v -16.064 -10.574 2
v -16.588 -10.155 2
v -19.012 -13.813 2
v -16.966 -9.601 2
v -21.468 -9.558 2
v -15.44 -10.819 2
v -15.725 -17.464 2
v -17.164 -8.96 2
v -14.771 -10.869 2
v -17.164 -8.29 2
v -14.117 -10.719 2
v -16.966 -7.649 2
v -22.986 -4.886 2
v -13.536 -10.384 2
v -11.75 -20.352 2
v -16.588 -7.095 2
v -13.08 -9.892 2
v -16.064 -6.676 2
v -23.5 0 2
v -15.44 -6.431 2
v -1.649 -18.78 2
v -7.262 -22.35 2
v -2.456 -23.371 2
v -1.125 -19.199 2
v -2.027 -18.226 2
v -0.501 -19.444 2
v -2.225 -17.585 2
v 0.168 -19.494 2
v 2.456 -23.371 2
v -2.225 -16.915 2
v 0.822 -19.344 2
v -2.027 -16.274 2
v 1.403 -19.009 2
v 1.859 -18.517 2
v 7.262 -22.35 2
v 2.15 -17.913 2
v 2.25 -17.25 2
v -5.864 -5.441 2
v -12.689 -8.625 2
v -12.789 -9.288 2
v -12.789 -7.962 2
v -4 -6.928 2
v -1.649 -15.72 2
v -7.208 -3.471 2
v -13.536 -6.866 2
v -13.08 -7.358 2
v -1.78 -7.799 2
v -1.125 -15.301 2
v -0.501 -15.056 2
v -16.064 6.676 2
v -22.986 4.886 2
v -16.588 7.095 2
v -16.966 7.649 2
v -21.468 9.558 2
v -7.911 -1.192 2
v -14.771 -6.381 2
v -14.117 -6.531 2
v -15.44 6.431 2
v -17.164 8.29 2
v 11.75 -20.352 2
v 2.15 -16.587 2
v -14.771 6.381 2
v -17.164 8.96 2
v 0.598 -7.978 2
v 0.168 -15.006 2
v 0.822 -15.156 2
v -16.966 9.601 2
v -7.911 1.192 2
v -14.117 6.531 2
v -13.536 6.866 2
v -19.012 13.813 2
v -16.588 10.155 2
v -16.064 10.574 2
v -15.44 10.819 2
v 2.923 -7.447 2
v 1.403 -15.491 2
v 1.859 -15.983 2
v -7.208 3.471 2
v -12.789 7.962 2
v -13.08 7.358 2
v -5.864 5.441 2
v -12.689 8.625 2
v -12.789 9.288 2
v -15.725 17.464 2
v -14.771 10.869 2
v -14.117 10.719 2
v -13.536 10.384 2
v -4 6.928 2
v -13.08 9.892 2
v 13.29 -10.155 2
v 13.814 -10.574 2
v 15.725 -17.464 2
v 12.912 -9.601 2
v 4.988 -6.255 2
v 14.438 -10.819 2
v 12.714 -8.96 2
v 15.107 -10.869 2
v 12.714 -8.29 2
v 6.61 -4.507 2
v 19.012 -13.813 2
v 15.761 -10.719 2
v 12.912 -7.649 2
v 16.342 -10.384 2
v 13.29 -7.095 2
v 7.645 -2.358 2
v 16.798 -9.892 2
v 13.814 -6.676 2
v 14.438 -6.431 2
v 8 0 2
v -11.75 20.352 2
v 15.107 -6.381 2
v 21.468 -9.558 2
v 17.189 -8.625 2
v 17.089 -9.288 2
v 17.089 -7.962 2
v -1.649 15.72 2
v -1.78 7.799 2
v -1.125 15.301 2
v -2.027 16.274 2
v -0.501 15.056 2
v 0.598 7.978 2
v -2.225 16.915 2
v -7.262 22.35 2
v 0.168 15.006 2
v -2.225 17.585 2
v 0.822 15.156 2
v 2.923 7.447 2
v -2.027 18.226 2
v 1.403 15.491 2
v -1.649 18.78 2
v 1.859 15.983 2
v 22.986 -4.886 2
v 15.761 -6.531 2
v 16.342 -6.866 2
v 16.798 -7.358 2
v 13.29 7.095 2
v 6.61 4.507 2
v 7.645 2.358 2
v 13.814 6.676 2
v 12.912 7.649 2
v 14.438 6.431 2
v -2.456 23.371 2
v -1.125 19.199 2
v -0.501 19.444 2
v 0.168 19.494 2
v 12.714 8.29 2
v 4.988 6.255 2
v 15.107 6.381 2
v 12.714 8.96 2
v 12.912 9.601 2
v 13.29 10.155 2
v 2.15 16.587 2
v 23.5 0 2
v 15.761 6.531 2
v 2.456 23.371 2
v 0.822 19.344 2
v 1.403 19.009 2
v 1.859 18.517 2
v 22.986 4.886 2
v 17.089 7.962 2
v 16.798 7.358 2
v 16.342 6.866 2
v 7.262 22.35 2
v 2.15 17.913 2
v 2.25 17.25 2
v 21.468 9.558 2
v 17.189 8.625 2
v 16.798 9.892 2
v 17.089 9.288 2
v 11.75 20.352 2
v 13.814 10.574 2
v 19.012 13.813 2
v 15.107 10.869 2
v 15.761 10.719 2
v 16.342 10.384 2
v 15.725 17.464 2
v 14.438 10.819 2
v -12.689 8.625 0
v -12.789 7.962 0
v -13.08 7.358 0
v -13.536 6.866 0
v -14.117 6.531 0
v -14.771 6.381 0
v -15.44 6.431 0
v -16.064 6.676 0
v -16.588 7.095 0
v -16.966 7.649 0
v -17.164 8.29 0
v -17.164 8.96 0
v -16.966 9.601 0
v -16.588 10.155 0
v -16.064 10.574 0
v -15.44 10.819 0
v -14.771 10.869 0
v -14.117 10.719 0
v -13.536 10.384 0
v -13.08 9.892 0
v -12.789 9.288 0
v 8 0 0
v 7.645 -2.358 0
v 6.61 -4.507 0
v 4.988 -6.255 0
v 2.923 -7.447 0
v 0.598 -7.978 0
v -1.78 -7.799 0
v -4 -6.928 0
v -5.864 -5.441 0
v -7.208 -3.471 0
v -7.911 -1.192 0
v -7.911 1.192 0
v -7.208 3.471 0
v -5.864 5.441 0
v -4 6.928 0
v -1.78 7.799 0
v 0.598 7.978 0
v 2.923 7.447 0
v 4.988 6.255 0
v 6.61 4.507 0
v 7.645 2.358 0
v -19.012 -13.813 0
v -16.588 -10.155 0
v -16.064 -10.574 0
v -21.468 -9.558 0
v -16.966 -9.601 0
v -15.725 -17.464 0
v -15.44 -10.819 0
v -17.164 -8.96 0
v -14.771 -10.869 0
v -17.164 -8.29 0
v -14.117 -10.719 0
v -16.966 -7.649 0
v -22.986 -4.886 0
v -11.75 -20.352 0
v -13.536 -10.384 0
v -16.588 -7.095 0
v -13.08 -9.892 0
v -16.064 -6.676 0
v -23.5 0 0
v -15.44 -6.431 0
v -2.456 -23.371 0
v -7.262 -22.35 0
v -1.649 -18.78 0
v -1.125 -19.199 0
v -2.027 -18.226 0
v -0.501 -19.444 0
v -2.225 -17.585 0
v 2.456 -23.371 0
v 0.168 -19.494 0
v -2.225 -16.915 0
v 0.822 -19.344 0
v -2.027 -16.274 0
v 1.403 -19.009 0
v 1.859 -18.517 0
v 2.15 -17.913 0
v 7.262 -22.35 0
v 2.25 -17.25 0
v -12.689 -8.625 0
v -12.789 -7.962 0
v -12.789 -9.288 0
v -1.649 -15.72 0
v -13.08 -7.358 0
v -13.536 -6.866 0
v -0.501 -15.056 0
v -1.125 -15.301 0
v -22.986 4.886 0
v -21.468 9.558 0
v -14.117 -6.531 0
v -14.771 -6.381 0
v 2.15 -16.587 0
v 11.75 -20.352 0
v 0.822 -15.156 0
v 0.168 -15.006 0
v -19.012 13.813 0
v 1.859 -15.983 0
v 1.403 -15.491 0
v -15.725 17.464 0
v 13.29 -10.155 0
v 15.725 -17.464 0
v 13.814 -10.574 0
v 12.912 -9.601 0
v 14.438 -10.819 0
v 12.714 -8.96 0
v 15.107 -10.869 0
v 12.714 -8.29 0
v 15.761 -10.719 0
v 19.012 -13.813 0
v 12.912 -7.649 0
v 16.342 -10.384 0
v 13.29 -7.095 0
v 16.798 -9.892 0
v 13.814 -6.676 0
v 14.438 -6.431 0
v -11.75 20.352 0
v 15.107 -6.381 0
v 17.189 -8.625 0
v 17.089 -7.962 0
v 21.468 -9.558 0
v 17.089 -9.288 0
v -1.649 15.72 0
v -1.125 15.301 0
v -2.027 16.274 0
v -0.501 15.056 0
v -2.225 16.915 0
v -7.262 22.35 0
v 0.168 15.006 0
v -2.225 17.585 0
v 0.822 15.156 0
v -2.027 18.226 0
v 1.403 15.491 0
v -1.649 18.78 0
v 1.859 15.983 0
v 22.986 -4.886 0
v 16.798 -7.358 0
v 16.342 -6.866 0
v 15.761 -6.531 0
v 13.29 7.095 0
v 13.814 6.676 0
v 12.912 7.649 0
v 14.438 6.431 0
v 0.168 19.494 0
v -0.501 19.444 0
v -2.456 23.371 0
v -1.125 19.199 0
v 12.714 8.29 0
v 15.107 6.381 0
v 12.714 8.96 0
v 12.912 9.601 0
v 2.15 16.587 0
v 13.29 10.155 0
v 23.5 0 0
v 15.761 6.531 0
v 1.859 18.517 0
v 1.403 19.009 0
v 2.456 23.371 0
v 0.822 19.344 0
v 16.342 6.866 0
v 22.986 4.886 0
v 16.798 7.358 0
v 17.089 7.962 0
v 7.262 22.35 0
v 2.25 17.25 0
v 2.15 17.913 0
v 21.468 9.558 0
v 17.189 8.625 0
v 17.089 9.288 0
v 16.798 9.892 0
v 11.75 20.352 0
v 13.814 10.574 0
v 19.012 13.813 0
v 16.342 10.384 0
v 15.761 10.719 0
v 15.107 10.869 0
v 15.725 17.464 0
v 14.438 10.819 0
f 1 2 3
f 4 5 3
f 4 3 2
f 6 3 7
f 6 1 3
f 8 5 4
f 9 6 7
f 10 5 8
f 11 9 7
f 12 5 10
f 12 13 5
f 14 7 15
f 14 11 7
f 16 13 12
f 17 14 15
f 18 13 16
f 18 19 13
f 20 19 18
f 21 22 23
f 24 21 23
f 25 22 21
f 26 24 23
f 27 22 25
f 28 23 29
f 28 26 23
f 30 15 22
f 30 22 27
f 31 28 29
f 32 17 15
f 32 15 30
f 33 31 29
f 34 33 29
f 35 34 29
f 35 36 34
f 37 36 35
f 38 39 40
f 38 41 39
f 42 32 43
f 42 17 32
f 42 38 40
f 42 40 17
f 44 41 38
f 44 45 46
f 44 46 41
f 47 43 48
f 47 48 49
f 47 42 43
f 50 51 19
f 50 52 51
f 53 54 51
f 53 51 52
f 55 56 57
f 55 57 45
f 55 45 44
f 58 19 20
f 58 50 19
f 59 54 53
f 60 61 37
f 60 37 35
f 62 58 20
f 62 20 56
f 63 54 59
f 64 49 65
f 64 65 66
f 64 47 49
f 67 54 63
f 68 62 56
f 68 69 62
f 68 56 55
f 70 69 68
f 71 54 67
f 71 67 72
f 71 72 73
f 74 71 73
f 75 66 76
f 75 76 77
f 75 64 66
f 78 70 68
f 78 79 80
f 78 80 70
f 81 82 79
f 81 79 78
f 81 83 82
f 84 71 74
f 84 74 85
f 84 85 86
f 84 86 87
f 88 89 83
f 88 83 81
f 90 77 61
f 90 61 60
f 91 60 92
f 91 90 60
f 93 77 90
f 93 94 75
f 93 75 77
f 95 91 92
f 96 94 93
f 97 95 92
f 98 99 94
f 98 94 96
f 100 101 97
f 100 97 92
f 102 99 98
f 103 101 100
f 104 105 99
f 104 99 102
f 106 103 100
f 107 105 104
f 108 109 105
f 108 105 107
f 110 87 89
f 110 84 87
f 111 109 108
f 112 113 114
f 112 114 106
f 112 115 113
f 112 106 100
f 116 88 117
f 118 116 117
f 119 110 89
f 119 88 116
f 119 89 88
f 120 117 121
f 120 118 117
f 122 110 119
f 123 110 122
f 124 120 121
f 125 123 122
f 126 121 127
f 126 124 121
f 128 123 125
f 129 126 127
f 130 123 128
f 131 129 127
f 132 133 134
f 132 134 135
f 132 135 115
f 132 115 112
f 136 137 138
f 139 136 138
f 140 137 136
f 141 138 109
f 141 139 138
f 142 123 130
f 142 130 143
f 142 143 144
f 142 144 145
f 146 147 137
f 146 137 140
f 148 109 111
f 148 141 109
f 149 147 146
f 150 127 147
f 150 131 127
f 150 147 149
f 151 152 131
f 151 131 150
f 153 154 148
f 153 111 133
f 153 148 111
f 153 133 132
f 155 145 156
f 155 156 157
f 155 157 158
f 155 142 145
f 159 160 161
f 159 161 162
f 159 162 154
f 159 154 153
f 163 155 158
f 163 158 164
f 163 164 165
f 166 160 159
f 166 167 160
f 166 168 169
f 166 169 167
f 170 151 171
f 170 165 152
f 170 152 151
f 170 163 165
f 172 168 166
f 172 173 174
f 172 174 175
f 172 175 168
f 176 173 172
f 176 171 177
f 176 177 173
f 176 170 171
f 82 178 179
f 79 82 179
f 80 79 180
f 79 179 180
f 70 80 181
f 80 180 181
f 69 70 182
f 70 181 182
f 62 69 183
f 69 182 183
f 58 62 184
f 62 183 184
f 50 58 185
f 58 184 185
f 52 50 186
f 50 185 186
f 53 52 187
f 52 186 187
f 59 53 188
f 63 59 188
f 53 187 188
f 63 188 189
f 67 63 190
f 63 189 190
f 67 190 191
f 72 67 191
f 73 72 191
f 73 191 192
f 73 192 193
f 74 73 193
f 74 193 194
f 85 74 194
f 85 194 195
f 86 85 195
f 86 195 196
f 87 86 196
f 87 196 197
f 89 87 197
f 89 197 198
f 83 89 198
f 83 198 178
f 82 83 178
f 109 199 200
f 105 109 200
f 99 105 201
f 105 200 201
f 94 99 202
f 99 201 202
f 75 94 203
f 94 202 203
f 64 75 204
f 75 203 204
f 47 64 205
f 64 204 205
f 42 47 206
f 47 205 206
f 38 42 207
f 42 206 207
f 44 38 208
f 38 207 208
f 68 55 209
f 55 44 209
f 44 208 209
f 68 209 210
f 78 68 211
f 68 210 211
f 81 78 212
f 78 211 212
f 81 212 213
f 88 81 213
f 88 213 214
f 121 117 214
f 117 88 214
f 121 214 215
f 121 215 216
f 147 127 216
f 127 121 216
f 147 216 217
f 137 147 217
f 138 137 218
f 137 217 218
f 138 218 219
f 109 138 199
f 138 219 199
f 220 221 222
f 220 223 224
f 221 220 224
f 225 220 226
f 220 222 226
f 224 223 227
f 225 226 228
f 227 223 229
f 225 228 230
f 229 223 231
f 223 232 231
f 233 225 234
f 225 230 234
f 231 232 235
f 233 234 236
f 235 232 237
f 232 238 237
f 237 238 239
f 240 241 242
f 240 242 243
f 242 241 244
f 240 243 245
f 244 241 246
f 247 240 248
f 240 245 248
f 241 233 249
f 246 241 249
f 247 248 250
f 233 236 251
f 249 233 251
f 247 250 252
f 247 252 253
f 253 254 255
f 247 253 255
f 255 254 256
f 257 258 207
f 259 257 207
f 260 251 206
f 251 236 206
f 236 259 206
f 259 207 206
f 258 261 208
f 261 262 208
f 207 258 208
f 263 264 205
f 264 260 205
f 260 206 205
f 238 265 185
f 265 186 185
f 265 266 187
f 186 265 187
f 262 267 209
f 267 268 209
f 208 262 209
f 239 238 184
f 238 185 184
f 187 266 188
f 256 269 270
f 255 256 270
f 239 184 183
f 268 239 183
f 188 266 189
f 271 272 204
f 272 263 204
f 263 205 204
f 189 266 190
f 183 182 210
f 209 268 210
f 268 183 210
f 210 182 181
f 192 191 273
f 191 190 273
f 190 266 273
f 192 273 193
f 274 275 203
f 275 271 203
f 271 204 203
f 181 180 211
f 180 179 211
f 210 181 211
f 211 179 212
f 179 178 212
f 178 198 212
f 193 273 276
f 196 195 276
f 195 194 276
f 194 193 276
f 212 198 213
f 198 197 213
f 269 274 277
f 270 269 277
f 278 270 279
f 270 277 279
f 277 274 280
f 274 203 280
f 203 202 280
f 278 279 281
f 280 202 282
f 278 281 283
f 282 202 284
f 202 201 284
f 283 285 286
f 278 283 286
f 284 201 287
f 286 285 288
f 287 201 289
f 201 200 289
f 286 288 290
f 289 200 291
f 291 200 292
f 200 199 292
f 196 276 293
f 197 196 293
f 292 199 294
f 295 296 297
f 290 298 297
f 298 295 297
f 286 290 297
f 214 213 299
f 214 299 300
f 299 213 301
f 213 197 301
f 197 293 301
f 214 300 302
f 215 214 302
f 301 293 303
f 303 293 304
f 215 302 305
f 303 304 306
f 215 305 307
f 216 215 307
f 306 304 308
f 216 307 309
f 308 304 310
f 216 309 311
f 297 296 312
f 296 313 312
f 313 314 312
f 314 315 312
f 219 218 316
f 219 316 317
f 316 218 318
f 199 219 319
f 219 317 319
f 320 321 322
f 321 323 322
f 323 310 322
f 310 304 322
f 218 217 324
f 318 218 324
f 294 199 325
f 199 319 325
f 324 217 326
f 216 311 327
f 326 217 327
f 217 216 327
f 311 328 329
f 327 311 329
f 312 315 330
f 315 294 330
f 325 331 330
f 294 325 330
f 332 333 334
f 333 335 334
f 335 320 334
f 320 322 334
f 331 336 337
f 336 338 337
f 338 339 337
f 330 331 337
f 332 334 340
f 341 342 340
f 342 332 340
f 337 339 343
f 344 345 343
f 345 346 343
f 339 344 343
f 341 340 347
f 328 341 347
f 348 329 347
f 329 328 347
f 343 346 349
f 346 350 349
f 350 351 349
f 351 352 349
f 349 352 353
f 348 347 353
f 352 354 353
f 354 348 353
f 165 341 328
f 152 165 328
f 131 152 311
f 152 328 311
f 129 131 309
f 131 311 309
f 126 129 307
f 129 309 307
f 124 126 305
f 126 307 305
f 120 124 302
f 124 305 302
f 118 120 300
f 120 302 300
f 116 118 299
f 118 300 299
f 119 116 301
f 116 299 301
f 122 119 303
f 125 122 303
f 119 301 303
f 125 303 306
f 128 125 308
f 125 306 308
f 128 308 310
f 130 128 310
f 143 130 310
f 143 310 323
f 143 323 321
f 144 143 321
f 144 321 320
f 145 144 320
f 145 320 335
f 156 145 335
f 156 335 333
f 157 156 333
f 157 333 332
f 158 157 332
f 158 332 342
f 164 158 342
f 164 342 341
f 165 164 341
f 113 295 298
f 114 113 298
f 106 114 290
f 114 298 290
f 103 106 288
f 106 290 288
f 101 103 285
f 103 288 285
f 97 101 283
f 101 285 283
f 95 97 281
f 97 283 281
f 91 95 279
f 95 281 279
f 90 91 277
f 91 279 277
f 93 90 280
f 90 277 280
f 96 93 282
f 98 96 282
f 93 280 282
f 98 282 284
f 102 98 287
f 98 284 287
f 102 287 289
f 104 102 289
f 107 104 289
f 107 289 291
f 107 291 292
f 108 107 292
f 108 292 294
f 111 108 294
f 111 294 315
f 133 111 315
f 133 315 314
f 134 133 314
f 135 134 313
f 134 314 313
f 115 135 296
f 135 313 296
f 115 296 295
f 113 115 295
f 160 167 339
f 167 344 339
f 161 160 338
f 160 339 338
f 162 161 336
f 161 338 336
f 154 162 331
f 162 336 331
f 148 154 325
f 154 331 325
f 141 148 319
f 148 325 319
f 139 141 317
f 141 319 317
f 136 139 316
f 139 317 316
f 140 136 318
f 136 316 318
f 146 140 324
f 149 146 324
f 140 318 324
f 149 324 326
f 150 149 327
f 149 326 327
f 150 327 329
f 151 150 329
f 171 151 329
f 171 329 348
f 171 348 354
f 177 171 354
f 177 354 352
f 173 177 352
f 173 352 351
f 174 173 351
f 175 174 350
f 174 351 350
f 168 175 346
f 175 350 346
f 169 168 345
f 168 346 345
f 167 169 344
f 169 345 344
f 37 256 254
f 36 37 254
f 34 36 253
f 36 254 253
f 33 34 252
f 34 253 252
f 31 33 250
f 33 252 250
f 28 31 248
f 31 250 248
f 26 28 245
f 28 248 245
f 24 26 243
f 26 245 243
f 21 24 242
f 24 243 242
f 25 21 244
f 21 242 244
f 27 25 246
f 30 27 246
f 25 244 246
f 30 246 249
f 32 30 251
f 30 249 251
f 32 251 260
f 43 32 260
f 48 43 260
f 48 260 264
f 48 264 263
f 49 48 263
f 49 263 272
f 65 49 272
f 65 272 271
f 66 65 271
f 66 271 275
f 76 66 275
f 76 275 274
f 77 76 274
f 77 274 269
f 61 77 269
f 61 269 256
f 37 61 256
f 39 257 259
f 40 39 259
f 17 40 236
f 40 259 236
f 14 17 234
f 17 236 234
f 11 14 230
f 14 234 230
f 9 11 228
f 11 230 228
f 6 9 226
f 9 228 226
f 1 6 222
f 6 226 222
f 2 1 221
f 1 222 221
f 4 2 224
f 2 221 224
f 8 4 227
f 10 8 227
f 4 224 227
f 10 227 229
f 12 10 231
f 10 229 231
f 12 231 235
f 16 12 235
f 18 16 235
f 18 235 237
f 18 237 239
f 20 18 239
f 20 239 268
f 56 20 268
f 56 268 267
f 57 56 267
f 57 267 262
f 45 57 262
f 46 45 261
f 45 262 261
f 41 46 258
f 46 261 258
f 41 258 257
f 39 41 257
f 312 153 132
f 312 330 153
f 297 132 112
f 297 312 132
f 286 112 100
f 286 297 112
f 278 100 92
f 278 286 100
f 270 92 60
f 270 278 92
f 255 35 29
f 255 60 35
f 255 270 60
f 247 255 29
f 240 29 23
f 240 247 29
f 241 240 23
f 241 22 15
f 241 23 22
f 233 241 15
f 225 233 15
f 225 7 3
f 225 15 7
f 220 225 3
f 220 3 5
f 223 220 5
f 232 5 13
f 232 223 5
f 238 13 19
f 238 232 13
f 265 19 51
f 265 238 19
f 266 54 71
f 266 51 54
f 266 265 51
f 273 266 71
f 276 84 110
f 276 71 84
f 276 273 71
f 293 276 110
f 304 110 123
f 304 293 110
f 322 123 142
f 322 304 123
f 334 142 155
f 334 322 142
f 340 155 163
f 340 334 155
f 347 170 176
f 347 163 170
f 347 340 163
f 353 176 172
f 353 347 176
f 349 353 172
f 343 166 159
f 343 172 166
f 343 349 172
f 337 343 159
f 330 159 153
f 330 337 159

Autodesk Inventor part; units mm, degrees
ref_plane "YZ Plane" through (0, 0, 0) normal (1, 0, 0) x (0, 1, 0)
ref_plane "XZ Plane" through (0, 0, 0) normal (0, 1, 0) x (-1, 0, 0)
ref_plane "XY Plane" through (0, 0, 0) normal (0, 0, 1) x (1, 0, 0)
sketch "Sketch1" plane through (0, 0, 0) normal (0, 0, 1) x (1, 0, 0)
  circle A0 centre (0, 0) radius 23.5
  circle A1 centre (0, 0) radius 17.25
  circle A2 centre (0, 17.25) radius 2.25
  circle A3 centre (-14.9389, 8.625) radius 2.25
  circle A4 centre (-14.9389, -8.625) radius 2.25
  circle A5 centre (0, -17.25) radius 2.25
  circle A6 centre (14.9389, -8.625) radius 2.25
  circle A7 centre (14.9389, 8.625) radius 2.25
  circle A8 centre (0, 0) radius 8
  dimension "d1" = 34.5
  dimension "d0" = 47
  dimension "d2" = 4.5
  dimension "d5" = 360
  dimension "d7" = 16
extrude "Extrusion1" add sketch "Sketch1" along normal blind 2 contours A0 | A1 A6 A5 A4 A3 A2 A7
properties part number "rotor_hub_retainer"
